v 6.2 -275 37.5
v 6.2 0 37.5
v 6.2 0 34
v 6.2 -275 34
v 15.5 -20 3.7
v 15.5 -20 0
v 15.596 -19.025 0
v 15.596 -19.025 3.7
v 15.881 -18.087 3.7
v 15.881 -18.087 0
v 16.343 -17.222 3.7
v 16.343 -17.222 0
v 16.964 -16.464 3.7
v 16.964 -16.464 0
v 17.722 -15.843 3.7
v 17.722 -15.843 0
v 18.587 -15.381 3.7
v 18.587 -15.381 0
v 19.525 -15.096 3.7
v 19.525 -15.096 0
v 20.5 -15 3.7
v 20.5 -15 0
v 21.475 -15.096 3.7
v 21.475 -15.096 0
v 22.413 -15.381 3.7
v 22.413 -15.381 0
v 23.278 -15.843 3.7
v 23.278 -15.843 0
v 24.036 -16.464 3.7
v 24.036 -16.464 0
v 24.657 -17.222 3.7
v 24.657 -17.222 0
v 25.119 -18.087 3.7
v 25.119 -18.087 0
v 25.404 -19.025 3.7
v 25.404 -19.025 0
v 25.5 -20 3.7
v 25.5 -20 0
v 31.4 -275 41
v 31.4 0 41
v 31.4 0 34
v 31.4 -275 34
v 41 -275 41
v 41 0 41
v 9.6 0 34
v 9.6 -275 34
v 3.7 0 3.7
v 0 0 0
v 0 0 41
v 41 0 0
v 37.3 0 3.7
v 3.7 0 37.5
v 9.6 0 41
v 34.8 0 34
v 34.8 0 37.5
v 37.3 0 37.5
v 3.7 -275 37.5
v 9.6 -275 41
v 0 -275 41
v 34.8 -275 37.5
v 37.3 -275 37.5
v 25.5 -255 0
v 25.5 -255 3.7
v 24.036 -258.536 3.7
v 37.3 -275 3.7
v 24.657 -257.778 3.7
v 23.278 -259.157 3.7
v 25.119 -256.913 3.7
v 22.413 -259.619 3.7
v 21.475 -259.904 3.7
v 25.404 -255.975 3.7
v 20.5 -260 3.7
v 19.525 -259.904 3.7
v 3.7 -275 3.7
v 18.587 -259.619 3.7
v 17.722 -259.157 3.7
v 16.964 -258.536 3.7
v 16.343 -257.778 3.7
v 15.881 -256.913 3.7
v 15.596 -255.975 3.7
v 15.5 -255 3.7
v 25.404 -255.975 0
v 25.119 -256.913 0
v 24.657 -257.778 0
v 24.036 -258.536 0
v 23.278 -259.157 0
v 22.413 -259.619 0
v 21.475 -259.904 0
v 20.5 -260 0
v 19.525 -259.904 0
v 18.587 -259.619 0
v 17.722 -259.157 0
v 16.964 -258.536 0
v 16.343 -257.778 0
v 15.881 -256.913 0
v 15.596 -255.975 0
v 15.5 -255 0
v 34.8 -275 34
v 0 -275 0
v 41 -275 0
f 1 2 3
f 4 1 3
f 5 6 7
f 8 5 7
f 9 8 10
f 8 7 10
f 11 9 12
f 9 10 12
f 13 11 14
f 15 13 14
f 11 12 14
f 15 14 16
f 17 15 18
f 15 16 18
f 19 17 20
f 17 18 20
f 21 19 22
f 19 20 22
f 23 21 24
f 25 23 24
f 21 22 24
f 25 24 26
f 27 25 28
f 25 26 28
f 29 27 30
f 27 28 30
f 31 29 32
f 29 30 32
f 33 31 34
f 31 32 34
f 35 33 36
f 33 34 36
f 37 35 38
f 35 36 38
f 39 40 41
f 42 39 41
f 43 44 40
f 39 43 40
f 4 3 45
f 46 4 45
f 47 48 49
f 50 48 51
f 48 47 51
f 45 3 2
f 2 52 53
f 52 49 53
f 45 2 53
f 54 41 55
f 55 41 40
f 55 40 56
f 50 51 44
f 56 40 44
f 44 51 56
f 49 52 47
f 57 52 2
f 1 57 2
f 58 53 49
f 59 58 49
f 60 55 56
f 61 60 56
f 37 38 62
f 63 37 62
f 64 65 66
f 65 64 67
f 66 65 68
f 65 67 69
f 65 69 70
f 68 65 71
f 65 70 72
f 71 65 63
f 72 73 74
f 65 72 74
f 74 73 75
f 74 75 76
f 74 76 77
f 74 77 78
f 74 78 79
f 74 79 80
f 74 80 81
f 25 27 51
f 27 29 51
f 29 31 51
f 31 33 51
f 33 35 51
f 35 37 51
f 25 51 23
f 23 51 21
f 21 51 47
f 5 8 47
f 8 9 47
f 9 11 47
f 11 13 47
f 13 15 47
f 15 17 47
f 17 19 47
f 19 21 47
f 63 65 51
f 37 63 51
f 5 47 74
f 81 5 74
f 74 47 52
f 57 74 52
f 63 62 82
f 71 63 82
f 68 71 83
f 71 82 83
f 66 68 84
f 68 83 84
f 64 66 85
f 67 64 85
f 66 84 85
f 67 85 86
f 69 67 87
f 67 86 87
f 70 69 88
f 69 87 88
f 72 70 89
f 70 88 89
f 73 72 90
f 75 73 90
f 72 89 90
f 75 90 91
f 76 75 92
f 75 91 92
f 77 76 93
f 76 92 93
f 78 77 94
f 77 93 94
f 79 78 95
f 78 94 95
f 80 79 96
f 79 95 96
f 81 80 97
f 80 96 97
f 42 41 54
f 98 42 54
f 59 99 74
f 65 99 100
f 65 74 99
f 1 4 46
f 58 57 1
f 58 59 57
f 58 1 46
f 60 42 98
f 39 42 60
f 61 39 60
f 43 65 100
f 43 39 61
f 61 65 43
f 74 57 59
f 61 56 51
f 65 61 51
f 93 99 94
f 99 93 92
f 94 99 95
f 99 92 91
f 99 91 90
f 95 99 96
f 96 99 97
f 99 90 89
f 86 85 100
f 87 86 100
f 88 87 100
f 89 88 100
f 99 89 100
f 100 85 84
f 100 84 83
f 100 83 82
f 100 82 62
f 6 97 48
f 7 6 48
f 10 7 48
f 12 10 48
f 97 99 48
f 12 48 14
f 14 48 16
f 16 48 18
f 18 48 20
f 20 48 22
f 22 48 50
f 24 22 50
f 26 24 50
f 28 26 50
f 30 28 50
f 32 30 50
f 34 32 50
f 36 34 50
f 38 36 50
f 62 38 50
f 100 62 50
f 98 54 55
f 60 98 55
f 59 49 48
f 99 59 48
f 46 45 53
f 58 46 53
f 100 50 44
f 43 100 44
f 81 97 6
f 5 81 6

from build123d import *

# Parameters (mm, degrees)
F1_DEPTH = 275
F3_DEPTH = 3.7


with BuildPart() as f1:
    # F0 (on Front) → F1 (new body)
    with BuildSketch(Plane.XZ):
        Polygon((0, 41), (0, 0), (41, 0), (41, 41), (31.4, 41), (31.4, 34), (34.8, 34), (34.8, 37.5), (37.3, 37.5), (37.3, 3.7), (3.7, 3.7), (3.7, 37.5), (6.2, 37.5), (6.2, 34), (9.6, 34), (9.6, 41), align=None)
    extrude(amount=F1_DEPTH)

    # F2 (on face) → F3 (cut, through all)
    with BuildSketch(Plane(origin=(0, 0, 0), x_dir=(1, 0, 0), z_dir=(0, 0, -1))):
        with BuildLine():
            Line((15.5, 255), (15.5, 20))
            ThreePointArc((15.5, 20), (20.5, 15), (25.5, 20))
            Line((25.5, 20), (25.5, 255))
            ThreePointArc((25.5, 255), (20.5, 260), (15.5, 255))
        make_face()
    extrude(amount=-F3_DEPTH, mode=Mode.SUBTRACT)


solid = f1.part
